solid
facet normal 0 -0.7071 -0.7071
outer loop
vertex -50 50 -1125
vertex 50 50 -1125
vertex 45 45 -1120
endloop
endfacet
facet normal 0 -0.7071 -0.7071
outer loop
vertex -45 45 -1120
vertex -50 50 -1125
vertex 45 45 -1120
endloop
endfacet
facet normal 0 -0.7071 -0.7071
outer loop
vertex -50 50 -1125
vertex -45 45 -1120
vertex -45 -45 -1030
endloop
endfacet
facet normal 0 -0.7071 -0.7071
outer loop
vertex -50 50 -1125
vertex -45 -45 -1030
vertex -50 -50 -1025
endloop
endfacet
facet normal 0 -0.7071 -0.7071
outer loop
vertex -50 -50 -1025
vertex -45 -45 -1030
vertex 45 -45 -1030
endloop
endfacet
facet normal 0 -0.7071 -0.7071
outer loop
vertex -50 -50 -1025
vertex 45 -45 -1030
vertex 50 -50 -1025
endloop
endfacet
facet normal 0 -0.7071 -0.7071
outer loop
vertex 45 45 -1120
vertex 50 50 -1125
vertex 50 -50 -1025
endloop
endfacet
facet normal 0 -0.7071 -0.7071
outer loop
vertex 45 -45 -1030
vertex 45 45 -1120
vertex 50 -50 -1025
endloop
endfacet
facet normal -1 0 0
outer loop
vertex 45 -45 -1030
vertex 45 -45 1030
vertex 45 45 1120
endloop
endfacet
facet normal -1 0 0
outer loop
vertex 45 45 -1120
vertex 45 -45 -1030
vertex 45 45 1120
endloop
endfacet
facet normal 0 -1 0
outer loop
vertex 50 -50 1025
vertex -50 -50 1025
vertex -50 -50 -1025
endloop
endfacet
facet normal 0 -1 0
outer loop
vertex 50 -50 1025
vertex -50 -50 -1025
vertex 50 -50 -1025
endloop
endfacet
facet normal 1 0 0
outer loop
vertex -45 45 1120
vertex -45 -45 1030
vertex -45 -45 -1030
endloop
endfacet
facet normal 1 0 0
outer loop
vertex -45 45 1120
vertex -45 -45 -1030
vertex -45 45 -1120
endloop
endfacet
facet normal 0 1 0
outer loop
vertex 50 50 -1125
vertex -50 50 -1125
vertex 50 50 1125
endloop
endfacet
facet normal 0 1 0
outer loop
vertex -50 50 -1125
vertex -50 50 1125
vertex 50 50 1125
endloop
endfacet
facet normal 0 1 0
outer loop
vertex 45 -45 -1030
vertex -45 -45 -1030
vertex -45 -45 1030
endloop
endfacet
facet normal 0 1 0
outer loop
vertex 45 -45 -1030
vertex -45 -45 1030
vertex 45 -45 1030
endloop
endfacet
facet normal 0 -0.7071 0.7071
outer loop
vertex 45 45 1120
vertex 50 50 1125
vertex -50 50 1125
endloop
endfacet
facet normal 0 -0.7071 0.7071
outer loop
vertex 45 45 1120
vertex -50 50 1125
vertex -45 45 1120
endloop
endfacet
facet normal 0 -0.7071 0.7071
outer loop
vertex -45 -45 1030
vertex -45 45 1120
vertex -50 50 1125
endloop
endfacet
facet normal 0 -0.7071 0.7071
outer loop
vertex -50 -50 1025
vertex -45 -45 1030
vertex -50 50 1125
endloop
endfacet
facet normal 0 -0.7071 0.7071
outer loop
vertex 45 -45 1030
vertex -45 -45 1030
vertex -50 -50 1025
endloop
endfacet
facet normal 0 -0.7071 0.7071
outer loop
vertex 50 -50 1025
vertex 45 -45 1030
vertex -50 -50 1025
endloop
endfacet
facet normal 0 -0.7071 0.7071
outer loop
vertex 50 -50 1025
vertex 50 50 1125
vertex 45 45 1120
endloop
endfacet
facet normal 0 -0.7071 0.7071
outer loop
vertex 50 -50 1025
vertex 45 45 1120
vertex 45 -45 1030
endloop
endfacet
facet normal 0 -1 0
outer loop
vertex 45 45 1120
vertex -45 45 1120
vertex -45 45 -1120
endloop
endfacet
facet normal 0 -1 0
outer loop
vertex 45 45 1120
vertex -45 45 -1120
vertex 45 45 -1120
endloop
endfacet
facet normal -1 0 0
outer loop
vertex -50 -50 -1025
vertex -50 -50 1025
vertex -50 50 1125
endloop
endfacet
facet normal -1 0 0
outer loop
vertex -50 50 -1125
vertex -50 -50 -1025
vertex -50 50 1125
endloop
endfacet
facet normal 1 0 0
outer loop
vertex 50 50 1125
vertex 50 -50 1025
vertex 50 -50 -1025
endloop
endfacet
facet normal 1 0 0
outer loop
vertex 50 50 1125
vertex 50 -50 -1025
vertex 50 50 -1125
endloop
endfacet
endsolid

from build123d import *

# Parameters (mm, degrees)
SKETCH1_W               = 100
SKETCH1_H               = 100
SKETCH1_W_2             = 90
SKETCH1_H_2             = 90
BOSS_EXTRUDE1_DEPTH     = 1125
CUT_EXTRUDE1_DEPTH      = 51
CUT_EXTRUDE1_DEPTH_BACK = 51


with BuildPart() as part:
    # Sketch1 → Boss-Extrude1 (new body, symmetric)
    with BuildSketch(Plane.XY):
        Rectangle(SKETCH1_W, SKETCH1_H)
        Rectangle(SKETCH1_W_2, SKETCH1_H_2, mode=Mode.SUBTRACT)
    extrude(amount=BOSS_EXTRUDE1_DEPTH, both=True)

    # Sketch4 → Cut-Extrude1 (cut, two sides)
    with BuildSketch(Plane(origin=(0, 0, 0), x_dir=(0, 0, -1), z_dir=(1, 0, 0))) as cut_extrude1_sk:
        Polygon((-1125, 50), (-1025, -50), (-1125, -50), align=None)
        Polygon((1125, 50), (1025, -50), (1125, -50), align=None)
    extrude(amount=CUT_EXTRUDE1_DEPTH, mode=Mode.SUBTRACT)
    extrude(cut_extrude1_sk.sketch, amount=-CUT_EXTRUDE1_DEPTH_BACK, mode=Mode.SUBTRACT)


solid = part.part
